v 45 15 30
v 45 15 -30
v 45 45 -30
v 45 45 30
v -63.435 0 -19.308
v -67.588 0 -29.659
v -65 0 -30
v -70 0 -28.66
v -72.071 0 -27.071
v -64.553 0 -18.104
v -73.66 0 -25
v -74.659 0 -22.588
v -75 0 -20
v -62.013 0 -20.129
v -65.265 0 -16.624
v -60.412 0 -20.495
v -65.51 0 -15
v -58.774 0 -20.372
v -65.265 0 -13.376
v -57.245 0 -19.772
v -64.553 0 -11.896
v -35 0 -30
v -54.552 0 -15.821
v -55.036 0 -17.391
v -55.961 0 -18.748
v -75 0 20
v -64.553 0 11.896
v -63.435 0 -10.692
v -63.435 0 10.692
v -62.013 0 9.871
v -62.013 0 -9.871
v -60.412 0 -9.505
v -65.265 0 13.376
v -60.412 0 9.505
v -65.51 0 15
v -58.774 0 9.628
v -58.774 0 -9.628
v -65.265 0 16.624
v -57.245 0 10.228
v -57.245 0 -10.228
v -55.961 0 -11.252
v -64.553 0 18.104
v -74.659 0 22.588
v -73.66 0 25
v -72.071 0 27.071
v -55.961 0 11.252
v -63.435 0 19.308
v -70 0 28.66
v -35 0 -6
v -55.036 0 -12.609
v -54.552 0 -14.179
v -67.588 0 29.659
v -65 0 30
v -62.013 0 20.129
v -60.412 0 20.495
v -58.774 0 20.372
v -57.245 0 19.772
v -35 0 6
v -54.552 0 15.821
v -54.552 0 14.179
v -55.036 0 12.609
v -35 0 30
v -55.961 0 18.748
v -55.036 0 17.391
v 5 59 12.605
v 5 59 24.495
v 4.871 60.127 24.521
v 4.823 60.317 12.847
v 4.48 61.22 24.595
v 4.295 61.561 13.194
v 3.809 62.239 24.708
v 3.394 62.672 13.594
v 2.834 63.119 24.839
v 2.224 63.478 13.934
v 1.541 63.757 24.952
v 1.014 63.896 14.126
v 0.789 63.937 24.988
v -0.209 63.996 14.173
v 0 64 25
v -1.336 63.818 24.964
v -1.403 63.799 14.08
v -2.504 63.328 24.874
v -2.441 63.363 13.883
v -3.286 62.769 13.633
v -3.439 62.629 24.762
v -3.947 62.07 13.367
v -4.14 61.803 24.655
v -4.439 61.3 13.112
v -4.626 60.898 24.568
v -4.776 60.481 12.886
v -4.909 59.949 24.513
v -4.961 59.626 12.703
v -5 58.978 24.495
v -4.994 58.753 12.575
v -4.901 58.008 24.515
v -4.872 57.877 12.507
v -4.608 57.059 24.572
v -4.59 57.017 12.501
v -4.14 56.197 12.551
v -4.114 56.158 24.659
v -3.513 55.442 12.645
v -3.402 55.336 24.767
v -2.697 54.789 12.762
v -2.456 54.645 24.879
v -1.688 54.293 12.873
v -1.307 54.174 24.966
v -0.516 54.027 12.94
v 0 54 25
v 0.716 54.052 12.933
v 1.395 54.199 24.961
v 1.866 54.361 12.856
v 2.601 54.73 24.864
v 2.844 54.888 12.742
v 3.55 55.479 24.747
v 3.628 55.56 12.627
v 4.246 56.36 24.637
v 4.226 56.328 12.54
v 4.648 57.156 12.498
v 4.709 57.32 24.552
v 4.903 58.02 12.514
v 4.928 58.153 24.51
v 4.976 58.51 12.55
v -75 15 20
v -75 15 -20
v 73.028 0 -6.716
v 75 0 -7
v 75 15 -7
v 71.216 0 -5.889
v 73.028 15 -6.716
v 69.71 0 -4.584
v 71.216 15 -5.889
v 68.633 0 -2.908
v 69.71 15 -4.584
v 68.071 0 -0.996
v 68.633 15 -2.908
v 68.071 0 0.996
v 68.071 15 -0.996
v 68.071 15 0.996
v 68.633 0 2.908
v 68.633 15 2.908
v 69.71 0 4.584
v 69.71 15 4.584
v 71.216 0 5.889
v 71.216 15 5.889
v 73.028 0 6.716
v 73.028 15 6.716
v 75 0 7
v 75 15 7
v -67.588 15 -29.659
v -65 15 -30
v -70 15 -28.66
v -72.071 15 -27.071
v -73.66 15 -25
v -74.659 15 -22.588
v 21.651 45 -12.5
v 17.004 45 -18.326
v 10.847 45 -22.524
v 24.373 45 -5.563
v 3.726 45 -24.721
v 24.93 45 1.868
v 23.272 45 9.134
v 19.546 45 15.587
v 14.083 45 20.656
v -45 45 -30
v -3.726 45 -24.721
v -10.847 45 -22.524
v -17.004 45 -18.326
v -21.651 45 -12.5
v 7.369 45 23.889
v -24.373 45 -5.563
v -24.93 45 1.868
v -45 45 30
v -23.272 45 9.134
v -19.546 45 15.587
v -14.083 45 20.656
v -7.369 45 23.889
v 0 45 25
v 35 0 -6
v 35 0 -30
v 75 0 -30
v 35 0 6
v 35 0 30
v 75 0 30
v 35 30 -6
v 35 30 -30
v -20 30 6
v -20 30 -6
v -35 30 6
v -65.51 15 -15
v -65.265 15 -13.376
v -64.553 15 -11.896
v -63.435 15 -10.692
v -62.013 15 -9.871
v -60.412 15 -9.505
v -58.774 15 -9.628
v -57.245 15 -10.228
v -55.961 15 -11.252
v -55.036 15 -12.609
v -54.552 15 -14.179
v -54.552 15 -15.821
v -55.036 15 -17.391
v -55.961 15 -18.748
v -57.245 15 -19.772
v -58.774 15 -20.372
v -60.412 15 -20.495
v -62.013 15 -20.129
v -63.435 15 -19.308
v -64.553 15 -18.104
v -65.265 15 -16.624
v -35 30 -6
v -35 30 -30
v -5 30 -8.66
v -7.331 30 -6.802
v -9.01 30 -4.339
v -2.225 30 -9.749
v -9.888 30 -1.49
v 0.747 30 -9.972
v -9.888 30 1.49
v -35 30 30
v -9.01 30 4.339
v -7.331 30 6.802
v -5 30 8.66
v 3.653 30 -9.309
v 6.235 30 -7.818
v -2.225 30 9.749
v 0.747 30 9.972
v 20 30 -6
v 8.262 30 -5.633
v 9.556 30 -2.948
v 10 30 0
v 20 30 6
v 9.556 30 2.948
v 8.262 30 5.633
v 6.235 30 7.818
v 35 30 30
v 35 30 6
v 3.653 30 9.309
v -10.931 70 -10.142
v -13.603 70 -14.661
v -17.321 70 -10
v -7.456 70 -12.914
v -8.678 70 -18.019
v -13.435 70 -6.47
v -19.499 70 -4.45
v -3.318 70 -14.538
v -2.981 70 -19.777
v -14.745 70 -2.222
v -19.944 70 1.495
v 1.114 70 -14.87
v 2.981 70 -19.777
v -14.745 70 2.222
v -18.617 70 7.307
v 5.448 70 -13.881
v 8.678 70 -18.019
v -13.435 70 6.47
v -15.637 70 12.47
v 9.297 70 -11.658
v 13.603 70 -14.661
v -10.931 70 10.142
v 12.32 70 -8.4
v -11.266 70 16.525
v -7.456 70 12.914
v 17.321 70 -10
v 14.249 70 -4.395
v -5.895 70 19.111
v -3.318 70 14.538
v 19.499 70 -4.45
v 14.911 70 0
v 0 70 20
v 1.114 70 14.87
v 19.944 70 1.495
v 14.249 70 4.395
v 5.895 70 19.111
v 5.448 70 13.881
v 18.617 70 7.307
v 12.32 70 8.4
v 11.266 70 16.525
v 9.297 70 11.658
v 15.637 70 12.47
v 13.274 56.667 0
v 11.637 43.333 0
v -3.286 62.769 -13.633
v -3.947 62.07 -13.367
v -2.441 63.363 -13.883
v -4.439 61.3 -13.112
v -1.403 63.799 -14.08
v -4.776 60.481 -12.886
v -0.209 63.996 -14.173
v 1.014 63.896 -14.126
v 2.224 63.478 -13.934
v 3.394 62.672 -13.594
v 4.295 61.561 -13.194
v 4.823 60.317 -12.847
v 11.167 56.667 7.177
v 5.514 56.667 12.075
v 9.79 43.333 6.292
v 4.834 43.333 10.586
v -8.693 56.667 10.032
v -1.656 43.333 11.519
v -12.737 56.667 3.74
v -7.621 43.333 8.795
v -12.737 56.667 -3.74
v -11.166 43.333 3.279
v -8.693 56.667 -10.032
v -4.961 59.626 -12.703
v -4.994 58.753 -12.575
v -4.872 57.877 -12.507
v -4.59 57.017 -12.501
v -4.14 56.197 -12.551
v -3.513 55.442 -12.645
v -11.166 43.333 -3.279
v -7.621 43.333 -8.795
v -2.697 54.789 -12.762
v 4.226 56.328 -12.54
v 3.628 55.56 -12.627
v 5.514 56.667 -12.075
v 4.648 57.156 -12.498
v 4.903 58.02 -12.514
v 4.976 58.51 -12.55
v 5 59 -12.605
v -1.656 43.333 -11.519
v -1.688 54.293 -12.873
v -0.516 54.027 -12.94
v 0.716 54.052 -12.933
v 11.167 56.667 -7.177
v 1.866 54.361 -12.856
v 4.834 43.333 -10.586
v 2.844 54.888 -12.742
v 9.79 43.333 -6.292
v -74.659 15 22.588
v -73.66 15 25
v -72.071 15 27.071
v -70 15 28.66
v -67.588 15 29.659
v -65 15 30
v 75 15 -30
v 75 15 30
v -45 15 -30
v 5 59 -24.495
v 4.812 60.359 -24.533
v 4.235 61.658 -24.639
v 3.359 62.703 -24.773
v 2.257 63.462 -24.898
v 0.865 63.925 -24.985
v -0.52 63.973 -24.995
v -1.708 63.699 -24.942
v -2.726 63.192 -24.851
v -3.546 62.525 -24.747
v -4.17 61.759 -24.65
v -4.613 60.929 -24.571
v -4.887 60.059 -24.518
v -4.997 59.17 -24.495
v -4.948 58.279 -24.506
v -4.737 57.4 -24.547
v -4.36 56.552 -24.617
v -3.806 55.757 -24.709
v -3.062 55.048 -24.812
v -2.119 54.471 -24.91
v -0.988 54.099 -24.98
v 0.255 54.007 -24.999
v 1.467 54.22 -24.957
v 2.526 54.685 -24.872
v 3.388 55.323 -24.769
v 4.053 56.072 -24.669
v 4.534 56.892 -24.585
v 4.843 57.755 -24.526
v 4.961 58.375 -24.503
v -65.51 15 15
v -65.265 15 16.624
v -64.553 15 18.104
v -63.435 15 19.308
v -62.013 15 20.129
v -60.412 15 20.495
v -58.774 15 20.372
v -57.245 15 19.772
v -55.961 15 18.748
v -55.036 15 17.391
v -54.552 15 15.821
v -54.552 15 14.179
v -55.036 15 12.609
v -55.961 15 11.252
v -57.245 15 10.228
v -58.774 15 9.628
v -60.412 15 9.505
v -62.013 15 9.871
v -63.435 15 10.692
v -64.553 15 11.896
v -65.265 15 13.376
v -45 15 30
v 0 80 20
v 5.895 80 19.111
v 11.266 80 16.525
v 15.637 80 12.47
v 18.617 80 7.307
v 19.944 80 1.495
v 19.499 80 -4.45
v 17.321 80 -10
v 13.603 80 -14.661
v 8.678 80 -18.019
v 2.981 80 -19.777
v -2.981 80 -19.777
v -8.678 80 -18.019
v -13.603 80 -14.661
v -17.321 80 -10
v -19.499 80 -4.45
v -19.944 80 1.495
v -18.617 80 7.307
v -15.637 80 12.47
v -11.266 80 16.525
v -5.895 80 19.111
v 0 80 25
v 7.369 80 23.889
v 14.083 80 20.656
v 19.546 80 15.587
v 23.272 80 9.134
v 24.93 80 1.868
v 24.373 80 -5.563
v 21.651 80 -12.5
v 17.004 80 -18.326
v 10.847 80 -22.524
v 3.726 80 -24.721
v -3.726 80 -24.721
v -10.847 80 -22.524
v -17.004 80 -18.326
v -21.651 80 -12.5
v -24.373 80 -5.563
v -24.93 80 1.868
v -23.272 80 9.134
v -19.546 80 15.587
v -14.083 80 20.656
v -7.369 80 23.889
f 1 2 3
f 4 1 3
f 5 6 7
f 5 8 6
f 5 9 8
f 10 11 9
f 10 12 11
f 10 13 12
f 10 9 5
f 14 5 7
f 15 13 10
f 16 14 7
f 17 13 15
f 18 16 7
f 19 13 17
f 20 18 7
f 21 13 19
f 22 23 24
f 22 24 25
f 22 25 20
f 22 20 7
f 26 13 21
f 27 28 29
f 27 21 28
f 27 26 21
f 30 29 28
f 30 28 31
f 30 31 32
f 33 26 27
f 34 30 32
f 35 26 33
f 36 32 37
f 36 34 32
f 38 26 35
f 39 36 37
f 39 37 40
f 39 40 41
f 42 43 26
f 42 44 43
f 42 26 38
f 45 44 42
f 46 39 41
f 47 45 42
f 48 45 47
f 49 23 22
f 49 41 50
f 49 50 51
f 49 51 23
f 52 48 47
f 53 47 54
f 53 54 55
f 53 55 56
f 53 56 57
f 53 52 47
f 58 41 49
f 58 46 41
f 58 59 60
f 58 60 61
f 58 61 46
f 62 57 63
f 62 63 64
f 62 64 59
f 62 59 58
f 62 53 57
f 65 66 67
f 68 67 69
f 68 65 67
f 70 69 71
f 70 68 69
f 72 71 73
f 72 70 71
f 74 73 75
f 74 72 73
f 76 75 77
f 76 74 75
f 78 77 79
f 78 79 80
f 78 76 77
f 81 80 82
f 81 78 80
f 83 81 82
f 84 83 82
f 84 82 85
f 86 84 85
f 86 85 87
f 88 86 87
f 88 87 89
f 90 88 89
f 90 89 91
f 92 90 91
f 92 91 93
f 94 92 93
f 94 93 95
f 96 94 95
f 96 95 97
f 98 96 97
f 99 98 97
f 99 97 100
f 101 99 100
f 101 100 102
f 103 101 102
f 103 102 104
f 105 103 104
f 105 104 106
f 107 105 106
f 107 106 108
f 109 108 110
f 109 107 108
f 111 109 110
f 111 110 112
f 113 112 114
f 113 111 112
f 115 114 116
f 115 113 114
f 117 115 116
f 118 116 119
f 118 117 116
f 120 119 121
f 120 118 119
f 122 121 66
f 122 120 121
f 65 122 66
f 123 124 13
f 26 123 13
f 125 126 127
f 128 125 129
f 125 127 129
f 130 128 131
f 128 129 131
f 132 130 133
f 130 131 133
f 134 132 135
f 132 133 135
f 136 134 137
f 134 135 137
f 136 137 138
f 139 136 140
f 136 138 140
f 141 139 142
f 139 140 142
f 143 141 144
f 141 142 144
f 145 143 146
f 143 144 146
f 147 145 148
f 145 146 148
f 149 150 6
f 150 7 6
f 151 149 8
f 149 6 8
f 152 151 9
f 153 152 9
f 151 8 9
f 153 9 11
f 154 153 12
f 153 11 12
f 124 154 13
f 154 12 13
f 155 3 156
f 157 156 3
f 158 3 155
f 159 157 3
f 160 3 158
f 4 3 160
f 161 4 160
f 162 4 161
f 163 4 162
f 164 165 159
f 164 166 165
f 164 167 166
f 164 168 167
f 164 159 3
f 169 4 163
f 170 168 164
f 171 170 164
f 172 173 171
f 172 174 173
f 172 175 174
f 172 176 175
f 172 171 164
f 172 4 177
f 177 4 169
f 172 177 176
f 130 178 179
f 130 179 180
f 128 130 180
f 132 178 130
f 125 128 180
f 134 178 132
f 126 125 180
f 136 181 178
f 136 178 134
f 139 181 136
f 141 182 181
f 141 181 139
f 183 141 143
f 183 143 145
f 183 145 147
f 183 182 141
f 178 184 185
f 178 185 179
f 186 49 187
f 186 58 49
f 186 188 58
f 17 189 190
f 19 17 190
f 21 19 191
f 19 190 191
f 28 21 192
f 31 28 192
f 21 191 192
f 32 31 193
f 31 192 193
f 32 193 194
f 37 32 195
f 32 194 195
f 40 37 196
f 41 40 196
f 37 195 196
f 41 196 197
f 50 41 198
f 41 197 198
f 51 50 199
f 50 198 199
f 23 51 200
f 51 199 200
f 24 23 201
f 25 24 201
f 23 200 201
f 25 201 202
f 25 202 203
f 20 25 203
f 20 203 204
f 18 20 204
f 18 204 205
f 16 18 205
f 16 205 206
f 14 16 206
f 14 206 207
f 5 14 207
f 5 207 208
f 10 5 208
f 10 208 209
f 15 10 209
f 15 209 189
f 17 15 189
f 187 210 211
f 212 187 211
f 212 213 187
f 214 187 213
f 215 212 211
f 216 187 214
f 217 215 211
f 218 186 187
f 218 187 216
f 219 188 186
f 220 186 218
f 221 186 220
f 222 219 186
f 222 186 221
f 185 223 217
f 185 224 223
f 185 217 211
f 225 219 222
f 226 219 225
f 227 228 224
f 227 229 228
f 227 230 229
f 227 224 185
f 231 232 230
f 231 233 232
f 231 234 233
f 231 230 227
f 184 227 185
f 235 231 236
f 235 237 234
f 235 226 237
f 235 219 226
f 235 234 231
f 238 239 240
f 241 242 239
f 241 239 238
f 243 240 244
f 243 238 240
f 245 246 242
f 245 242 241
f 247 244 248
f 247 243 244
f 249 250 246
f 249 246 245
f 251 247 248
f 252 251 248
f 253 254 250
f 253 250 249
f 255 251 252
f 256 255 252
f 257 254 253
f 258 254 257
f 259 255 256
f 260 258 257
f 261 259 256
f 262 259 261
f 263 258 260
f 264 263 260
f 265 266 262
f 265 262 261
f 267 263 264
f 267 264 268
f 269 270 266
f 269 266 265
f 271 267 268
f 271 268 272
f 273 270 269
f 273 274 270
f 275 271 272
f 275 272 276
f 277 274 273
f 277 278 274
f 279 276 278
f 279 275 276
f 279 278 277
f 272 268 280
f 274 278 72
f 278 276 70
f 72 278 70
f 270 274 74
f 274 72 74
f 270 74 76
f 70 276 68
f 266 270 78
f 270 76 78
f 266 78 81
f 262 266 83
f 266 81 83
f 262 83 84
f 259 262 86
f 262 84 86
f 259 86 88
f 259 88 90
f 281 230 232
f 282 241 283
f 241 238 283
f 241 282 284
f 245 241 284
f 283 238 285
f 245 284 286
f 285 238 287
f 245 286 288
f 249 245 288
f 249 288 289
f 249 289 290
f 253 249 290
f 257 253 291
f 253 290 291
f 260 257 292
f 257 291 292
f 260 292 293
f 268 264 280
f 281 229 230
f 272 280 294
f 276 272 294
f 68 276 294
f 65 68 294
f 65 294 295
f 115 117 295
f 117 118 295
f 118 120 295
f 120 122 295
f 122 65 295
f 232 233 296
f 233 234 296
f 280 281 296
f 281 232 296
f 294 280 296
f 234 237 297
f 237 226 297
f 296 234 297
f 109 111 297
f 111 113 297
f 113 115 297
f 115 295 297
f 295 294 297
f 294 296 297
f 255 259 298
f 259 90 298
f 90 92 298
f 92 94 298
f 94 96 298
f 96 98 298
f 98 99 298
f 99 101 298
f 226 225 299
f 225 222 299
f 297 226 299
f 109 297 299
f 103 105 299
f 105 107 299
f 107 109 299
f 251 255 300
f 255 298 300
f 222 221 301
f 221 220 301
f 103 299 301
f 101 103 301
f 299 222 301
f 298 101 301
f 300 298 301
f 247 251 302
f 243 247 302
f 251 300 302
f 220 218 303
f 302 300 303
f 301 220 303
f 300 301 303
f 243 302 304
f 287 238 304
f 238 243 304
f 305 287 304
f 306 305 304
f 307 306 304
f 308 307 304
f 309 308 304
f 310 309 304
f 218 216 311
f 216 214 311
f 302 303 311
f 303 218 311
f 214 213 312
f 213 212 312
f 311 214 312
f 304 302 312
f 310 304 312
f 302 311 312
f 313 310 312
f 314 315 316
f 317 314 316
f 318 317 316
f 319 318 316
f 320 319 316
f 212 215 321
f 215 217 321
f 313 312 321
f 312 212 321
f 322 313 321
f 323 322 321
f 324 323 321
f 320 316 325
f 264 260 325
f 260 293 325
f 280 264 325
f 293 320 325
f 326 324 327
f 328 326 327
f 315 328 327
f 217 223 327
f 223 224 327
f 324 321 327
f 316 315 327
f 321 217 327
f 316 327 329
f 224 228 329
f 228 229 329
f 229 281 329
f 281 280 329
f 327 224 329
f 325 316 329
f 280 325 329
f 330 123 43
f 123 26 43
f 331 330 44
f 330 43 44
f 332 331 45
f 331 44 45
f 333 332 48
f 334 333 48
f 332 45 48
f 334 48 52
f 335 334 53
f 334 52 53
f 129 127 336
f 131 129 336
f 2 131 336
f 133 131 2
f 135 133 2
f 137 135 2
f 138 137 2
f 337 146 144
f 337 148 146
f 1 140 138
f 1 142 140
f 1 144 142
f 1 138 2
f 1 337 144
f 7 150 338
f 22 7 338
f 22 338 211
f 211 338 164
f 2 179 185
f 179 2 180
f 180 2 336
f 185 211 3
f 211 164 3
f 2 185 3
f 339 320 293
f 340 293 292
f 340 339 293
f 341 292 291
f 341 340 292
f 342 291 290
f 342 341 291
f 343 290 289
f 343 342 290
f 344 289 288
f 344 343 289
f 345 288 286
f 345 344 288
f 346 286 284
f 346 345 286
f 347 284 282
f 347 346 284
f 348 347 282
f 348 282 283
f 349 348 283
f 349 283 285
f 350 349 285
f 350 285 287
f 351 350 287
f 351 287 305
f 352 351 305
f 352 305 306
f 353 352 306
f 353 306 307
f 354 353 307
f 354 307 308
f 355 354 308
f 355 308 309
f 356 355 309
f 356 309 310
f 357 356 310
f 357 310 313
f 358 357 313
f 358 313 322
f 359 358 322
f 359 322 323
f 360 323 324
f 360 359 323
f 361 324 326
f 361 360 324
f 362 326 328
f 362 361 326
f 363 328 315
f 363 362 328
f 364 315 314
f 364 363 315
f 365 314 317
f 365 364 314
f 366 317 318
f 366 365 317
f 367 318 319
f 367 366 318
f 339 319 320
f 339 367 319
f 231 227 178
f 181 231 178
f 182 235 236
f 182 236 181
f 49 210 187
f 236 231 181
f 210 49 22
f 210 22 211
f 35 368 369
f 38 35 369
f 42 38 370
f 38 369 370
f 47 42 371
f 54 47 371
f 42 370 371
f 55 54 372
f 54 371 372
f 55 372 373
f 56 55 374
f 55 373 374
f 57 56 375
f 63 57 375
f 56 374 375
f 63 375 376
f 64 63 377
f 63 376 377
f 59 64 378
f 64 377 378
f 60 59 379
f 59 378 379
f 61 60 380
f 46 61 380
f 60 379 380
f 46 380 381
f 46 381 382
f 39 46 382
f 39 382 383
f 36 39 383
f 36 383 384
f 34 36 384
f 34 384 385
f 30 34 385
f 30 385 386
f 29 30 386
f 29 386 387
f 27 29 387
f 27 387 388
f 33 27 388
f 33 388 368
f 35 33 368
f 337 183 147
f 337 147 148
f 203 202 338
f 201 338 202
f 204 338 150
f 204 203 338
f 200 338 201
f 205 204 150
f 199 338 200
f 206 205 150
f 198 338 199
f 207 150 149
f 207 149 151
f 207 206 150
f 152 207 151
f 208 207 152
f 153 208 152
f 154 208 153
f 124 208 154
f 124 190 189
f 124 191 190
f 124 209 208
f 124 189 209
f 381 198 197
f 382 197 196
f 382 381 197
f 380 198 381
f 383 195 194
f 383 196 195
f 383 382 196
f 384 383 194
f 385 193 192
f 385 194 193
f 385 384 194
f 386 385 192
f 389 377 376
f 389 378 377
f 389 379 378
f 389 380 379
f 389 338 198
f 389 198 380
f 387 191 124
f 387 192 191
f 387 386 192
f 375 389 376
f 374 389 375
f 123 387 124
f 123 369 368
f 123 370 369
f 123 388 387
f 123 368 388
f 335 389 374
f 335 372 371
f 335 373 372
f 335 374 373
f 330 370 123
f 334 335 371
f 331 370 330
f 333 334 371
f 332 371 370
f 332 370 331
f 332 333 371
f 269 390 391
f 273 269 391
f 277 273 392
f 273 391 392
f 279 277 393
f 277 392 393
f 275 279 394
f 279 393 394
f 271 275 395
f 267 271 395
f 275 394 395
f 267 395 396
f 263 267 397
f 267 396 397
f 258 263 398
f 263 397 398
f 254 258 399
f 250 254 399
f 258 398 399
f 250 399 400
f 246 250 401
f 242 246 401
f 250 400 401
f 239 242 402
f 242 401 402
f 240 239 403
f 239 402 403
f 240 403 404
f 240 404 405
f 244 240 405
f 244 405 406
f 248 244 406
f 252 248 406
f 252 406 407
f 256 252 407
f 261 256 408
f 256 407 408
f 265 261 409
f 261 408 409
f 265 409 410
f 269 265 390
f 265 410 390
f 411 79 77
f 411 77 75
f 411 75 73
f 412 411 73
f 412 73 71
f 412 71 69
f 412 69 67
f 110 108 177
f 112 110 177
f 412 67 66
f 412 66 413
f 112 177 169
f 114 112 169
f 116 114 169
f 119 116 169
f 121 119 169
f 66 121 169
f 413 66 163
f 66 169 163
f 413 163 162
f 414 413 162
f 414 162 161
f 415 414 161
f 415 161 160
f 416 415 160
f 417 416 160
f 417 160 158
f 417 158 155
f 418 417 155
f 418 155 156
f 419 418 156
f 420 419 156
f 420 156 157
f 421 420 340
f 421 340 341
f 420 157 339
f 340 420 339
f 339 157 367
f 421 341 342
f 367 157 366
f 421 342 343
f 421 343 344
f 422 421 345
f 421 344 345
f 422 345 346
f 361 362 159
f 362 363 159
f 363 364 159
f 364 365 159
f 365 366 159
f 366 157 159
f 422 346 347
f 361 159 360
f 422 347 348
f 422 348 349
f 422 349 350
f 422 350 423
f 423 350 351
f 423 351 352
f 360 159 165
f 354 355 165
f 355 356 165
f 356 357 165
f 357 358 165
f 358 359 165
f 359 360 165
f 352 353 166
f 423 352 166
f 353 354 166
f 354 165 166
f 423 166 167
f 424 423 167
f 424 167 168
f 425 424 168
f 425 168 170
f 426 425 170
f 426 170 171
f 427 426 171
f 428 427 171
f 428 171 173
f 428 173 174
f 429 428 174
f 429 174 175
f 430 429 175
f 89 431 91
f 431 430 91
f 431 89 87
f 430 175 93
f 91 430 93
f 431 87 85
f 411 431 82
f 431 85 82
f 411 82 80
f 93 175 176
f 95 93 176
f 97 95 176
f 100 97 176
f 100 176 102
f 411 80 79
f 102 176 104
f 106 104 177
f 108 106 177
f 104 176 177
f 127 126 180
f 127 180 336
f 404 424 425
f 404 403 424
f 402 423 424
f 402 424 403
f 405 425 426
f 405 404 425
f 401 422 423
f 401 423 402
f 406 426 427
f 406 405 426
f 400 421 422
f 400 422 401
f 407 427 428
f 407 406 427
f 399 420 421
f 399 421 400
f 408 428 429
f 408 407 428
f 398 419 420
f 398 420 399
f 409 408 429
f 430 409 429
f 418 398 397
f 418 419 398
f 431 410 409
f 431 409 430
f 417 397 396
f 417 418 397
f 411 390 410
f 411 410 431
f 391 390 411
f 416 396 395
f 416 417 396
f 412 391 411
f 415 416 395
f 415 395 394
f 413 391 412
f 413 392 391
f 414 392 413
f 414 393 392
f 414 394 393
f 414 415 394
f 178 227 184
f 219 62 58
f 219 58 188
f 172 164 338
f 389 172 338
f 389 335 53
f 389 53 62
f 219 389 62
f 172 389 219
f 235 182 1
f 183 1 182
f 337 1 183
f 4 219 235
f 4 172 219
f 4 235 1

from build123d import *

# Parameters (mm, degrees)
BOSS_EXTRUDE1_DEPTH     = 30
BOSS_EXTRUDE2_DEPTH     = 6
SKETCH3_R               = 5.510010548
CUT_EXTRUDE1_DEPTH      = 87.168439698
FILLET1_R               = 10
SKETCH4_R               = 7
CUT_EXTRUDE2_DEPTH      = 42
SKETCH5_R               = 25
BOSS_EXTRUDE3_DEPTH     = 35
SKETCH6_R               = 20
CUT_EXTRUDE3_DEPTH      = 10
SKETCH8_R               = 10
CUT_EXTRUDE4_DEPTH      = 40
CUT_EXTRUDE4_DRAFT      = 7
CUT_EXTRUDE5_DEPTH      = 114.688170009
CUT_EXTRUDE5_DEPTH_BACK = 114.688170009
SKETCH9_R               = 5


with BuildPart() as part:
    # Sketch1 → Boss-Extrude1 (new, symmetric)
    with BuildSketch(Plane.XY):
        Polygon((-45, 15), (-75, 15), (-75, 0), (-35, 0), (-35, 30), (35, 30), (35, 0), (75, 0), (75, 15), (45, 15), (45, 45), (-45, 45), align=None)
    extrude(amount=BOSS_EXTRUDE1_DEPTH, both=True)

    # Sketch2 → Boss-Extrude2 (add, symmetric)
    with BuildSketch(Plane.XY):
        Polygon((20, 30), (35, 0), (35, 30), align=None)
        Polygon((-35, 0), (-20, 30), (-35, 30), align=None)
    extrude(amount=BOSS_EXTRUDE2_DEPTH, both=True)

    # Sketch3 → Cut-Extrude1 (cut, through all)
    with BuildSketch(Plane(origin=(0, 15, 0), x_dir=(1, 0, 0), z_dir=(0, 1, 0))):
        with Locations(Location((-60, 15, 0), (0, 0, 180))):
            Circle(SKETCH3_R)
        with Locations(Location((-60, -15, 0), (0, 0, 180))):
            Circle(SKETCH3_R)
    extrude(amount=-CUT_EXTRUDE1_DEPTH, mode=Mode.SUBTRACT)

    # Fillet1
    fillet1_edges = [part.edges().sort_by_distance(p)[0] for p in [
        (-75, 7.5, -30),
        (-75, 7.5, 30),
    ]]
    fillet(fillet1_edges, radius=FILLET1_R)

    # Sketch4 → Cut-Extrude2 (cut)
    with BuildSketch(Plane(origin=(0, 15, 0), x_dir=(1, 0, 0), z_dir=(0, 1, 0))):
        with Locations((75, 0)):
            Circle(SKETCH4_R)
    extrude(amount=-CUT_EXTRUDE2_DEPTH, mode=Mode.SUBTRACT)

    # Sketch5 → Boss-Extrude3 (add)
    with BuildSketch(Plane(origin=(0, 45, 0), x_dir=(1, 0, 0), z_dir=(0, 1, 0))):
        with Locations(Location((0, 0, 0), (0, 0, 270))):
            Circle(SKETCH5_R)
    extrude(amount=BOSS_EXTRUDE3_DEPTH)

    # Sketch6 → Cut-Extrude3 (cut)
    with BuildSketch(Plane(origin=(0, 80, 0), x_dir=(1, 0, 0), z_dir=(0, 1, 0))):
        with Locations(Location((0, 0, 0), (0, 0, 270))):
            Circle(SKETCH6_R)
    extrude(amount=-CUT_EXTRUDE3_DEPTH, mode=Mode.SUBTRACT)


with BuildPart() as cut_extrude4_tool:
    # Sketch8 → Cut-Extrude4 (with draft: the straight prism first)
    with BuildSketch(Plane.XZ.offset(-30)):
        Circle(SKETCH8_R)
    extrude(amount=-CUT_EXTRUDE4_DEPTH)
    # Cut-Extrude4: the draft: its side faces are tilted about the plane it starts from
    cut_extrude4_sides = [cut_extrude4_tool.faces().sort_by_distance(p)[0] for p in [
        (-10, 50, 0),
    ]]
    draft(cut_extrude4_sides, Plane.XZ.offset(-30), CUT_EXTRUDE4_DRAFT)


with BuildPart() as part_1:
    add(part.part)

    # Cut-Extrude4: cut by cut_extrude4_tool
    add(cut_extrude4_tool.part, mode=Mode.SUBTRACT)

    # Sketch9 → Cut-Extrude5 (cut, two sides: drawn at the far end of the back side and taken through both)
    with BuildSketch(Plane.XY.offset(-CUT_EXTRUDE5_DEPTH_BACK)):
        with Locations((0, 59)):
            Circle(SKETCH9_R)
    extrude(amount=CUT_EXTRUDE5_DEPTH + CUT_EXTRUDE5_DEPTH_BACK, mode=Mode.SUBTRACT)


solid = part_1.part
